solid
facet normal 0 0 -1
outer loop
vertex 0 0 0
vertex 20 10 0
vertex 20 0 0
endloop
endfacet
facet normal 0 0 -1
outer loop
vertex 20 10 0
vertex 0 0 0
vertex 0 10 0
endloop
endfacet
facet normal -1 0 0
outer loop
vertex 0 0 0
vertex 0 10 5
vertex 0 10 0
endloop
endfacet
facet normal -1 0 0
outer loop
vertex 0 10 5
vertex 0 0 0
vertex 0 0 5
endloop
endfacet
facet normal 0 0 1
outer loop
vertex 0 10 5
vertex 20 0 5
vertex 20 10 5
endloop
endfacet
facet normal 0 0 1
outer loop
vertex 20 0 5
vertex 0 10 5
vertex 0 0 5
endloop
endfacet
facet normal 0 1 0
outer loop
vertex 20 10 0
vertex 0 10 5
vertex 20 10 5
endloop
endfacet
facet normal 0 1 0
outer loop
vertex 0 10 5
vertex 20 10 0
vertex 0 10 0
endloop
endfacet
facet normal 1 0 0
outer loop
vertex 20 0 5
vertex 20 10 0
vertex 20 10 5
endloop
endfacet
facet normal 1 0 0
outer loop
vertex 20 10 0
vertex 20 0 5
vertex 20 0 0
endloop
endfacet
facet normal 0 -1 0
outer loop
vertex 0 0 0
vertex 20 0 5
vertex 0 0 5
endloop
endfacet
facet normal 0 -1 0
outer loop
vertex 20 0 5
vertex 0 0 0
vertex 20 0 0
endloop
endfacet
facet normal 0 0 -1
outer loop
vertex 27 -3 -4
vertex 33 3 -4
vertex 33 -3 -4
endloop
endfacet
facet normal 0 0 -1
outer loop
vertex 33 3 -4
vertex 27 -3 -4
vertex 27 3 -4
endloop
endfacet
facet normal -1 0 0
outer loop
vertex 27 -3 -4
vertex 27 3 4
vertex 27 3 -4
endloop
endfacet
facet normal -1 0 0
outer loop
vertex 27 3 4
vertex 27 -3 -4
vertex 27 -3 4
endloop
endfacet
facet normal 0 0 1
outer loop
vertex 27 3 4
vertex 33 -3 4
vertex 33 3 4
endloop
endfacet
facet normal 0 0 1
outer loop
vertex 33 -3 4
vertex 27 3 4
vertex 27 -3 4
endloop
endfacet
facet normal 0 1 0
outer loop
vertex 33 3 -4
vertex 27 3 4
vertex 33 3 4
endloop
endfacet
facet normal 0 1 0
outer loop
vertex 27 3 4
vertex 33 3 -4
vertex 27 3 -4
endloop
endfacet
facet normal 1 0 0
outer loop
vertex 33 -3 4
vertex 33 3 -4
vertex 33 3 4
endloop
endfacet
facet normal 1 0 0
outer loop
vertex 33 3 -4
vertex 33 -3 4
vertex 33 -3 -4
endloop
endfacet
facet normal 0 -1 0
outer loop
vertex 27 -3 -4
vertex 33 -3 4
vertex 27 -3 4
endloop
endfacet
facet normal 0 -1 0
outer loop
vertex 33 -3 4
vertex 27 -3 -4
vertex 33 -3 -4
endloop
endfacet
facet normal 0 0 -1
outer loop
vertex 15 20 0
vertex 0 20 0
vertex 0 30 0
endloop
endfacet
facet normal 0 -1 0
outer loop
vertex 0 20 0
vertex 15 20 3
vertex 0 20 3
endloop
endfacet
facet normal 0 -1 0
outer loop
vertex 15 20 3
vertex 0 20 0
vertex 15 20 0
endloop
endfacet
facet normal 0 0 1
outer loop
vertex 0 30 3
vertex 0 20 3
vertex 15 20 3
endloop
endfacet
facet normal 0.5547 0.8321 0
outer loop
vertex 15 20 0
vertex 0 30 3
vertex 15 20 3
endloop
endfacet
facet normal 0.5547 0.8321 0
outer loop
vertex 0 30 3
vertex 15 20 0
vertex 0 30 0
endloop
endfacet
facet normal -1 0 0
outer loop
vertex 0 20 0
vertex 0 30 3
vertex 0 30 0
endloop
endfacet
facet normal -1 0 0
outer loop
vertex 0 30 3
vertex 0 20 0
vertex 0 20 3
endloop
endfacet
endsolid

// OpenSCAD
// Zweck: linear_extrude with height as name and positional, center = true.
linear_extrude(height = 5) square([20, 10]);
translate([30, 0, 0]) linear_extrude(8, center = true) square(6, center = true);
translate([0, 20, 0]) linear_extrude(height = 3) polygon([[0, 0], [15, 0], [0, 10]]);
